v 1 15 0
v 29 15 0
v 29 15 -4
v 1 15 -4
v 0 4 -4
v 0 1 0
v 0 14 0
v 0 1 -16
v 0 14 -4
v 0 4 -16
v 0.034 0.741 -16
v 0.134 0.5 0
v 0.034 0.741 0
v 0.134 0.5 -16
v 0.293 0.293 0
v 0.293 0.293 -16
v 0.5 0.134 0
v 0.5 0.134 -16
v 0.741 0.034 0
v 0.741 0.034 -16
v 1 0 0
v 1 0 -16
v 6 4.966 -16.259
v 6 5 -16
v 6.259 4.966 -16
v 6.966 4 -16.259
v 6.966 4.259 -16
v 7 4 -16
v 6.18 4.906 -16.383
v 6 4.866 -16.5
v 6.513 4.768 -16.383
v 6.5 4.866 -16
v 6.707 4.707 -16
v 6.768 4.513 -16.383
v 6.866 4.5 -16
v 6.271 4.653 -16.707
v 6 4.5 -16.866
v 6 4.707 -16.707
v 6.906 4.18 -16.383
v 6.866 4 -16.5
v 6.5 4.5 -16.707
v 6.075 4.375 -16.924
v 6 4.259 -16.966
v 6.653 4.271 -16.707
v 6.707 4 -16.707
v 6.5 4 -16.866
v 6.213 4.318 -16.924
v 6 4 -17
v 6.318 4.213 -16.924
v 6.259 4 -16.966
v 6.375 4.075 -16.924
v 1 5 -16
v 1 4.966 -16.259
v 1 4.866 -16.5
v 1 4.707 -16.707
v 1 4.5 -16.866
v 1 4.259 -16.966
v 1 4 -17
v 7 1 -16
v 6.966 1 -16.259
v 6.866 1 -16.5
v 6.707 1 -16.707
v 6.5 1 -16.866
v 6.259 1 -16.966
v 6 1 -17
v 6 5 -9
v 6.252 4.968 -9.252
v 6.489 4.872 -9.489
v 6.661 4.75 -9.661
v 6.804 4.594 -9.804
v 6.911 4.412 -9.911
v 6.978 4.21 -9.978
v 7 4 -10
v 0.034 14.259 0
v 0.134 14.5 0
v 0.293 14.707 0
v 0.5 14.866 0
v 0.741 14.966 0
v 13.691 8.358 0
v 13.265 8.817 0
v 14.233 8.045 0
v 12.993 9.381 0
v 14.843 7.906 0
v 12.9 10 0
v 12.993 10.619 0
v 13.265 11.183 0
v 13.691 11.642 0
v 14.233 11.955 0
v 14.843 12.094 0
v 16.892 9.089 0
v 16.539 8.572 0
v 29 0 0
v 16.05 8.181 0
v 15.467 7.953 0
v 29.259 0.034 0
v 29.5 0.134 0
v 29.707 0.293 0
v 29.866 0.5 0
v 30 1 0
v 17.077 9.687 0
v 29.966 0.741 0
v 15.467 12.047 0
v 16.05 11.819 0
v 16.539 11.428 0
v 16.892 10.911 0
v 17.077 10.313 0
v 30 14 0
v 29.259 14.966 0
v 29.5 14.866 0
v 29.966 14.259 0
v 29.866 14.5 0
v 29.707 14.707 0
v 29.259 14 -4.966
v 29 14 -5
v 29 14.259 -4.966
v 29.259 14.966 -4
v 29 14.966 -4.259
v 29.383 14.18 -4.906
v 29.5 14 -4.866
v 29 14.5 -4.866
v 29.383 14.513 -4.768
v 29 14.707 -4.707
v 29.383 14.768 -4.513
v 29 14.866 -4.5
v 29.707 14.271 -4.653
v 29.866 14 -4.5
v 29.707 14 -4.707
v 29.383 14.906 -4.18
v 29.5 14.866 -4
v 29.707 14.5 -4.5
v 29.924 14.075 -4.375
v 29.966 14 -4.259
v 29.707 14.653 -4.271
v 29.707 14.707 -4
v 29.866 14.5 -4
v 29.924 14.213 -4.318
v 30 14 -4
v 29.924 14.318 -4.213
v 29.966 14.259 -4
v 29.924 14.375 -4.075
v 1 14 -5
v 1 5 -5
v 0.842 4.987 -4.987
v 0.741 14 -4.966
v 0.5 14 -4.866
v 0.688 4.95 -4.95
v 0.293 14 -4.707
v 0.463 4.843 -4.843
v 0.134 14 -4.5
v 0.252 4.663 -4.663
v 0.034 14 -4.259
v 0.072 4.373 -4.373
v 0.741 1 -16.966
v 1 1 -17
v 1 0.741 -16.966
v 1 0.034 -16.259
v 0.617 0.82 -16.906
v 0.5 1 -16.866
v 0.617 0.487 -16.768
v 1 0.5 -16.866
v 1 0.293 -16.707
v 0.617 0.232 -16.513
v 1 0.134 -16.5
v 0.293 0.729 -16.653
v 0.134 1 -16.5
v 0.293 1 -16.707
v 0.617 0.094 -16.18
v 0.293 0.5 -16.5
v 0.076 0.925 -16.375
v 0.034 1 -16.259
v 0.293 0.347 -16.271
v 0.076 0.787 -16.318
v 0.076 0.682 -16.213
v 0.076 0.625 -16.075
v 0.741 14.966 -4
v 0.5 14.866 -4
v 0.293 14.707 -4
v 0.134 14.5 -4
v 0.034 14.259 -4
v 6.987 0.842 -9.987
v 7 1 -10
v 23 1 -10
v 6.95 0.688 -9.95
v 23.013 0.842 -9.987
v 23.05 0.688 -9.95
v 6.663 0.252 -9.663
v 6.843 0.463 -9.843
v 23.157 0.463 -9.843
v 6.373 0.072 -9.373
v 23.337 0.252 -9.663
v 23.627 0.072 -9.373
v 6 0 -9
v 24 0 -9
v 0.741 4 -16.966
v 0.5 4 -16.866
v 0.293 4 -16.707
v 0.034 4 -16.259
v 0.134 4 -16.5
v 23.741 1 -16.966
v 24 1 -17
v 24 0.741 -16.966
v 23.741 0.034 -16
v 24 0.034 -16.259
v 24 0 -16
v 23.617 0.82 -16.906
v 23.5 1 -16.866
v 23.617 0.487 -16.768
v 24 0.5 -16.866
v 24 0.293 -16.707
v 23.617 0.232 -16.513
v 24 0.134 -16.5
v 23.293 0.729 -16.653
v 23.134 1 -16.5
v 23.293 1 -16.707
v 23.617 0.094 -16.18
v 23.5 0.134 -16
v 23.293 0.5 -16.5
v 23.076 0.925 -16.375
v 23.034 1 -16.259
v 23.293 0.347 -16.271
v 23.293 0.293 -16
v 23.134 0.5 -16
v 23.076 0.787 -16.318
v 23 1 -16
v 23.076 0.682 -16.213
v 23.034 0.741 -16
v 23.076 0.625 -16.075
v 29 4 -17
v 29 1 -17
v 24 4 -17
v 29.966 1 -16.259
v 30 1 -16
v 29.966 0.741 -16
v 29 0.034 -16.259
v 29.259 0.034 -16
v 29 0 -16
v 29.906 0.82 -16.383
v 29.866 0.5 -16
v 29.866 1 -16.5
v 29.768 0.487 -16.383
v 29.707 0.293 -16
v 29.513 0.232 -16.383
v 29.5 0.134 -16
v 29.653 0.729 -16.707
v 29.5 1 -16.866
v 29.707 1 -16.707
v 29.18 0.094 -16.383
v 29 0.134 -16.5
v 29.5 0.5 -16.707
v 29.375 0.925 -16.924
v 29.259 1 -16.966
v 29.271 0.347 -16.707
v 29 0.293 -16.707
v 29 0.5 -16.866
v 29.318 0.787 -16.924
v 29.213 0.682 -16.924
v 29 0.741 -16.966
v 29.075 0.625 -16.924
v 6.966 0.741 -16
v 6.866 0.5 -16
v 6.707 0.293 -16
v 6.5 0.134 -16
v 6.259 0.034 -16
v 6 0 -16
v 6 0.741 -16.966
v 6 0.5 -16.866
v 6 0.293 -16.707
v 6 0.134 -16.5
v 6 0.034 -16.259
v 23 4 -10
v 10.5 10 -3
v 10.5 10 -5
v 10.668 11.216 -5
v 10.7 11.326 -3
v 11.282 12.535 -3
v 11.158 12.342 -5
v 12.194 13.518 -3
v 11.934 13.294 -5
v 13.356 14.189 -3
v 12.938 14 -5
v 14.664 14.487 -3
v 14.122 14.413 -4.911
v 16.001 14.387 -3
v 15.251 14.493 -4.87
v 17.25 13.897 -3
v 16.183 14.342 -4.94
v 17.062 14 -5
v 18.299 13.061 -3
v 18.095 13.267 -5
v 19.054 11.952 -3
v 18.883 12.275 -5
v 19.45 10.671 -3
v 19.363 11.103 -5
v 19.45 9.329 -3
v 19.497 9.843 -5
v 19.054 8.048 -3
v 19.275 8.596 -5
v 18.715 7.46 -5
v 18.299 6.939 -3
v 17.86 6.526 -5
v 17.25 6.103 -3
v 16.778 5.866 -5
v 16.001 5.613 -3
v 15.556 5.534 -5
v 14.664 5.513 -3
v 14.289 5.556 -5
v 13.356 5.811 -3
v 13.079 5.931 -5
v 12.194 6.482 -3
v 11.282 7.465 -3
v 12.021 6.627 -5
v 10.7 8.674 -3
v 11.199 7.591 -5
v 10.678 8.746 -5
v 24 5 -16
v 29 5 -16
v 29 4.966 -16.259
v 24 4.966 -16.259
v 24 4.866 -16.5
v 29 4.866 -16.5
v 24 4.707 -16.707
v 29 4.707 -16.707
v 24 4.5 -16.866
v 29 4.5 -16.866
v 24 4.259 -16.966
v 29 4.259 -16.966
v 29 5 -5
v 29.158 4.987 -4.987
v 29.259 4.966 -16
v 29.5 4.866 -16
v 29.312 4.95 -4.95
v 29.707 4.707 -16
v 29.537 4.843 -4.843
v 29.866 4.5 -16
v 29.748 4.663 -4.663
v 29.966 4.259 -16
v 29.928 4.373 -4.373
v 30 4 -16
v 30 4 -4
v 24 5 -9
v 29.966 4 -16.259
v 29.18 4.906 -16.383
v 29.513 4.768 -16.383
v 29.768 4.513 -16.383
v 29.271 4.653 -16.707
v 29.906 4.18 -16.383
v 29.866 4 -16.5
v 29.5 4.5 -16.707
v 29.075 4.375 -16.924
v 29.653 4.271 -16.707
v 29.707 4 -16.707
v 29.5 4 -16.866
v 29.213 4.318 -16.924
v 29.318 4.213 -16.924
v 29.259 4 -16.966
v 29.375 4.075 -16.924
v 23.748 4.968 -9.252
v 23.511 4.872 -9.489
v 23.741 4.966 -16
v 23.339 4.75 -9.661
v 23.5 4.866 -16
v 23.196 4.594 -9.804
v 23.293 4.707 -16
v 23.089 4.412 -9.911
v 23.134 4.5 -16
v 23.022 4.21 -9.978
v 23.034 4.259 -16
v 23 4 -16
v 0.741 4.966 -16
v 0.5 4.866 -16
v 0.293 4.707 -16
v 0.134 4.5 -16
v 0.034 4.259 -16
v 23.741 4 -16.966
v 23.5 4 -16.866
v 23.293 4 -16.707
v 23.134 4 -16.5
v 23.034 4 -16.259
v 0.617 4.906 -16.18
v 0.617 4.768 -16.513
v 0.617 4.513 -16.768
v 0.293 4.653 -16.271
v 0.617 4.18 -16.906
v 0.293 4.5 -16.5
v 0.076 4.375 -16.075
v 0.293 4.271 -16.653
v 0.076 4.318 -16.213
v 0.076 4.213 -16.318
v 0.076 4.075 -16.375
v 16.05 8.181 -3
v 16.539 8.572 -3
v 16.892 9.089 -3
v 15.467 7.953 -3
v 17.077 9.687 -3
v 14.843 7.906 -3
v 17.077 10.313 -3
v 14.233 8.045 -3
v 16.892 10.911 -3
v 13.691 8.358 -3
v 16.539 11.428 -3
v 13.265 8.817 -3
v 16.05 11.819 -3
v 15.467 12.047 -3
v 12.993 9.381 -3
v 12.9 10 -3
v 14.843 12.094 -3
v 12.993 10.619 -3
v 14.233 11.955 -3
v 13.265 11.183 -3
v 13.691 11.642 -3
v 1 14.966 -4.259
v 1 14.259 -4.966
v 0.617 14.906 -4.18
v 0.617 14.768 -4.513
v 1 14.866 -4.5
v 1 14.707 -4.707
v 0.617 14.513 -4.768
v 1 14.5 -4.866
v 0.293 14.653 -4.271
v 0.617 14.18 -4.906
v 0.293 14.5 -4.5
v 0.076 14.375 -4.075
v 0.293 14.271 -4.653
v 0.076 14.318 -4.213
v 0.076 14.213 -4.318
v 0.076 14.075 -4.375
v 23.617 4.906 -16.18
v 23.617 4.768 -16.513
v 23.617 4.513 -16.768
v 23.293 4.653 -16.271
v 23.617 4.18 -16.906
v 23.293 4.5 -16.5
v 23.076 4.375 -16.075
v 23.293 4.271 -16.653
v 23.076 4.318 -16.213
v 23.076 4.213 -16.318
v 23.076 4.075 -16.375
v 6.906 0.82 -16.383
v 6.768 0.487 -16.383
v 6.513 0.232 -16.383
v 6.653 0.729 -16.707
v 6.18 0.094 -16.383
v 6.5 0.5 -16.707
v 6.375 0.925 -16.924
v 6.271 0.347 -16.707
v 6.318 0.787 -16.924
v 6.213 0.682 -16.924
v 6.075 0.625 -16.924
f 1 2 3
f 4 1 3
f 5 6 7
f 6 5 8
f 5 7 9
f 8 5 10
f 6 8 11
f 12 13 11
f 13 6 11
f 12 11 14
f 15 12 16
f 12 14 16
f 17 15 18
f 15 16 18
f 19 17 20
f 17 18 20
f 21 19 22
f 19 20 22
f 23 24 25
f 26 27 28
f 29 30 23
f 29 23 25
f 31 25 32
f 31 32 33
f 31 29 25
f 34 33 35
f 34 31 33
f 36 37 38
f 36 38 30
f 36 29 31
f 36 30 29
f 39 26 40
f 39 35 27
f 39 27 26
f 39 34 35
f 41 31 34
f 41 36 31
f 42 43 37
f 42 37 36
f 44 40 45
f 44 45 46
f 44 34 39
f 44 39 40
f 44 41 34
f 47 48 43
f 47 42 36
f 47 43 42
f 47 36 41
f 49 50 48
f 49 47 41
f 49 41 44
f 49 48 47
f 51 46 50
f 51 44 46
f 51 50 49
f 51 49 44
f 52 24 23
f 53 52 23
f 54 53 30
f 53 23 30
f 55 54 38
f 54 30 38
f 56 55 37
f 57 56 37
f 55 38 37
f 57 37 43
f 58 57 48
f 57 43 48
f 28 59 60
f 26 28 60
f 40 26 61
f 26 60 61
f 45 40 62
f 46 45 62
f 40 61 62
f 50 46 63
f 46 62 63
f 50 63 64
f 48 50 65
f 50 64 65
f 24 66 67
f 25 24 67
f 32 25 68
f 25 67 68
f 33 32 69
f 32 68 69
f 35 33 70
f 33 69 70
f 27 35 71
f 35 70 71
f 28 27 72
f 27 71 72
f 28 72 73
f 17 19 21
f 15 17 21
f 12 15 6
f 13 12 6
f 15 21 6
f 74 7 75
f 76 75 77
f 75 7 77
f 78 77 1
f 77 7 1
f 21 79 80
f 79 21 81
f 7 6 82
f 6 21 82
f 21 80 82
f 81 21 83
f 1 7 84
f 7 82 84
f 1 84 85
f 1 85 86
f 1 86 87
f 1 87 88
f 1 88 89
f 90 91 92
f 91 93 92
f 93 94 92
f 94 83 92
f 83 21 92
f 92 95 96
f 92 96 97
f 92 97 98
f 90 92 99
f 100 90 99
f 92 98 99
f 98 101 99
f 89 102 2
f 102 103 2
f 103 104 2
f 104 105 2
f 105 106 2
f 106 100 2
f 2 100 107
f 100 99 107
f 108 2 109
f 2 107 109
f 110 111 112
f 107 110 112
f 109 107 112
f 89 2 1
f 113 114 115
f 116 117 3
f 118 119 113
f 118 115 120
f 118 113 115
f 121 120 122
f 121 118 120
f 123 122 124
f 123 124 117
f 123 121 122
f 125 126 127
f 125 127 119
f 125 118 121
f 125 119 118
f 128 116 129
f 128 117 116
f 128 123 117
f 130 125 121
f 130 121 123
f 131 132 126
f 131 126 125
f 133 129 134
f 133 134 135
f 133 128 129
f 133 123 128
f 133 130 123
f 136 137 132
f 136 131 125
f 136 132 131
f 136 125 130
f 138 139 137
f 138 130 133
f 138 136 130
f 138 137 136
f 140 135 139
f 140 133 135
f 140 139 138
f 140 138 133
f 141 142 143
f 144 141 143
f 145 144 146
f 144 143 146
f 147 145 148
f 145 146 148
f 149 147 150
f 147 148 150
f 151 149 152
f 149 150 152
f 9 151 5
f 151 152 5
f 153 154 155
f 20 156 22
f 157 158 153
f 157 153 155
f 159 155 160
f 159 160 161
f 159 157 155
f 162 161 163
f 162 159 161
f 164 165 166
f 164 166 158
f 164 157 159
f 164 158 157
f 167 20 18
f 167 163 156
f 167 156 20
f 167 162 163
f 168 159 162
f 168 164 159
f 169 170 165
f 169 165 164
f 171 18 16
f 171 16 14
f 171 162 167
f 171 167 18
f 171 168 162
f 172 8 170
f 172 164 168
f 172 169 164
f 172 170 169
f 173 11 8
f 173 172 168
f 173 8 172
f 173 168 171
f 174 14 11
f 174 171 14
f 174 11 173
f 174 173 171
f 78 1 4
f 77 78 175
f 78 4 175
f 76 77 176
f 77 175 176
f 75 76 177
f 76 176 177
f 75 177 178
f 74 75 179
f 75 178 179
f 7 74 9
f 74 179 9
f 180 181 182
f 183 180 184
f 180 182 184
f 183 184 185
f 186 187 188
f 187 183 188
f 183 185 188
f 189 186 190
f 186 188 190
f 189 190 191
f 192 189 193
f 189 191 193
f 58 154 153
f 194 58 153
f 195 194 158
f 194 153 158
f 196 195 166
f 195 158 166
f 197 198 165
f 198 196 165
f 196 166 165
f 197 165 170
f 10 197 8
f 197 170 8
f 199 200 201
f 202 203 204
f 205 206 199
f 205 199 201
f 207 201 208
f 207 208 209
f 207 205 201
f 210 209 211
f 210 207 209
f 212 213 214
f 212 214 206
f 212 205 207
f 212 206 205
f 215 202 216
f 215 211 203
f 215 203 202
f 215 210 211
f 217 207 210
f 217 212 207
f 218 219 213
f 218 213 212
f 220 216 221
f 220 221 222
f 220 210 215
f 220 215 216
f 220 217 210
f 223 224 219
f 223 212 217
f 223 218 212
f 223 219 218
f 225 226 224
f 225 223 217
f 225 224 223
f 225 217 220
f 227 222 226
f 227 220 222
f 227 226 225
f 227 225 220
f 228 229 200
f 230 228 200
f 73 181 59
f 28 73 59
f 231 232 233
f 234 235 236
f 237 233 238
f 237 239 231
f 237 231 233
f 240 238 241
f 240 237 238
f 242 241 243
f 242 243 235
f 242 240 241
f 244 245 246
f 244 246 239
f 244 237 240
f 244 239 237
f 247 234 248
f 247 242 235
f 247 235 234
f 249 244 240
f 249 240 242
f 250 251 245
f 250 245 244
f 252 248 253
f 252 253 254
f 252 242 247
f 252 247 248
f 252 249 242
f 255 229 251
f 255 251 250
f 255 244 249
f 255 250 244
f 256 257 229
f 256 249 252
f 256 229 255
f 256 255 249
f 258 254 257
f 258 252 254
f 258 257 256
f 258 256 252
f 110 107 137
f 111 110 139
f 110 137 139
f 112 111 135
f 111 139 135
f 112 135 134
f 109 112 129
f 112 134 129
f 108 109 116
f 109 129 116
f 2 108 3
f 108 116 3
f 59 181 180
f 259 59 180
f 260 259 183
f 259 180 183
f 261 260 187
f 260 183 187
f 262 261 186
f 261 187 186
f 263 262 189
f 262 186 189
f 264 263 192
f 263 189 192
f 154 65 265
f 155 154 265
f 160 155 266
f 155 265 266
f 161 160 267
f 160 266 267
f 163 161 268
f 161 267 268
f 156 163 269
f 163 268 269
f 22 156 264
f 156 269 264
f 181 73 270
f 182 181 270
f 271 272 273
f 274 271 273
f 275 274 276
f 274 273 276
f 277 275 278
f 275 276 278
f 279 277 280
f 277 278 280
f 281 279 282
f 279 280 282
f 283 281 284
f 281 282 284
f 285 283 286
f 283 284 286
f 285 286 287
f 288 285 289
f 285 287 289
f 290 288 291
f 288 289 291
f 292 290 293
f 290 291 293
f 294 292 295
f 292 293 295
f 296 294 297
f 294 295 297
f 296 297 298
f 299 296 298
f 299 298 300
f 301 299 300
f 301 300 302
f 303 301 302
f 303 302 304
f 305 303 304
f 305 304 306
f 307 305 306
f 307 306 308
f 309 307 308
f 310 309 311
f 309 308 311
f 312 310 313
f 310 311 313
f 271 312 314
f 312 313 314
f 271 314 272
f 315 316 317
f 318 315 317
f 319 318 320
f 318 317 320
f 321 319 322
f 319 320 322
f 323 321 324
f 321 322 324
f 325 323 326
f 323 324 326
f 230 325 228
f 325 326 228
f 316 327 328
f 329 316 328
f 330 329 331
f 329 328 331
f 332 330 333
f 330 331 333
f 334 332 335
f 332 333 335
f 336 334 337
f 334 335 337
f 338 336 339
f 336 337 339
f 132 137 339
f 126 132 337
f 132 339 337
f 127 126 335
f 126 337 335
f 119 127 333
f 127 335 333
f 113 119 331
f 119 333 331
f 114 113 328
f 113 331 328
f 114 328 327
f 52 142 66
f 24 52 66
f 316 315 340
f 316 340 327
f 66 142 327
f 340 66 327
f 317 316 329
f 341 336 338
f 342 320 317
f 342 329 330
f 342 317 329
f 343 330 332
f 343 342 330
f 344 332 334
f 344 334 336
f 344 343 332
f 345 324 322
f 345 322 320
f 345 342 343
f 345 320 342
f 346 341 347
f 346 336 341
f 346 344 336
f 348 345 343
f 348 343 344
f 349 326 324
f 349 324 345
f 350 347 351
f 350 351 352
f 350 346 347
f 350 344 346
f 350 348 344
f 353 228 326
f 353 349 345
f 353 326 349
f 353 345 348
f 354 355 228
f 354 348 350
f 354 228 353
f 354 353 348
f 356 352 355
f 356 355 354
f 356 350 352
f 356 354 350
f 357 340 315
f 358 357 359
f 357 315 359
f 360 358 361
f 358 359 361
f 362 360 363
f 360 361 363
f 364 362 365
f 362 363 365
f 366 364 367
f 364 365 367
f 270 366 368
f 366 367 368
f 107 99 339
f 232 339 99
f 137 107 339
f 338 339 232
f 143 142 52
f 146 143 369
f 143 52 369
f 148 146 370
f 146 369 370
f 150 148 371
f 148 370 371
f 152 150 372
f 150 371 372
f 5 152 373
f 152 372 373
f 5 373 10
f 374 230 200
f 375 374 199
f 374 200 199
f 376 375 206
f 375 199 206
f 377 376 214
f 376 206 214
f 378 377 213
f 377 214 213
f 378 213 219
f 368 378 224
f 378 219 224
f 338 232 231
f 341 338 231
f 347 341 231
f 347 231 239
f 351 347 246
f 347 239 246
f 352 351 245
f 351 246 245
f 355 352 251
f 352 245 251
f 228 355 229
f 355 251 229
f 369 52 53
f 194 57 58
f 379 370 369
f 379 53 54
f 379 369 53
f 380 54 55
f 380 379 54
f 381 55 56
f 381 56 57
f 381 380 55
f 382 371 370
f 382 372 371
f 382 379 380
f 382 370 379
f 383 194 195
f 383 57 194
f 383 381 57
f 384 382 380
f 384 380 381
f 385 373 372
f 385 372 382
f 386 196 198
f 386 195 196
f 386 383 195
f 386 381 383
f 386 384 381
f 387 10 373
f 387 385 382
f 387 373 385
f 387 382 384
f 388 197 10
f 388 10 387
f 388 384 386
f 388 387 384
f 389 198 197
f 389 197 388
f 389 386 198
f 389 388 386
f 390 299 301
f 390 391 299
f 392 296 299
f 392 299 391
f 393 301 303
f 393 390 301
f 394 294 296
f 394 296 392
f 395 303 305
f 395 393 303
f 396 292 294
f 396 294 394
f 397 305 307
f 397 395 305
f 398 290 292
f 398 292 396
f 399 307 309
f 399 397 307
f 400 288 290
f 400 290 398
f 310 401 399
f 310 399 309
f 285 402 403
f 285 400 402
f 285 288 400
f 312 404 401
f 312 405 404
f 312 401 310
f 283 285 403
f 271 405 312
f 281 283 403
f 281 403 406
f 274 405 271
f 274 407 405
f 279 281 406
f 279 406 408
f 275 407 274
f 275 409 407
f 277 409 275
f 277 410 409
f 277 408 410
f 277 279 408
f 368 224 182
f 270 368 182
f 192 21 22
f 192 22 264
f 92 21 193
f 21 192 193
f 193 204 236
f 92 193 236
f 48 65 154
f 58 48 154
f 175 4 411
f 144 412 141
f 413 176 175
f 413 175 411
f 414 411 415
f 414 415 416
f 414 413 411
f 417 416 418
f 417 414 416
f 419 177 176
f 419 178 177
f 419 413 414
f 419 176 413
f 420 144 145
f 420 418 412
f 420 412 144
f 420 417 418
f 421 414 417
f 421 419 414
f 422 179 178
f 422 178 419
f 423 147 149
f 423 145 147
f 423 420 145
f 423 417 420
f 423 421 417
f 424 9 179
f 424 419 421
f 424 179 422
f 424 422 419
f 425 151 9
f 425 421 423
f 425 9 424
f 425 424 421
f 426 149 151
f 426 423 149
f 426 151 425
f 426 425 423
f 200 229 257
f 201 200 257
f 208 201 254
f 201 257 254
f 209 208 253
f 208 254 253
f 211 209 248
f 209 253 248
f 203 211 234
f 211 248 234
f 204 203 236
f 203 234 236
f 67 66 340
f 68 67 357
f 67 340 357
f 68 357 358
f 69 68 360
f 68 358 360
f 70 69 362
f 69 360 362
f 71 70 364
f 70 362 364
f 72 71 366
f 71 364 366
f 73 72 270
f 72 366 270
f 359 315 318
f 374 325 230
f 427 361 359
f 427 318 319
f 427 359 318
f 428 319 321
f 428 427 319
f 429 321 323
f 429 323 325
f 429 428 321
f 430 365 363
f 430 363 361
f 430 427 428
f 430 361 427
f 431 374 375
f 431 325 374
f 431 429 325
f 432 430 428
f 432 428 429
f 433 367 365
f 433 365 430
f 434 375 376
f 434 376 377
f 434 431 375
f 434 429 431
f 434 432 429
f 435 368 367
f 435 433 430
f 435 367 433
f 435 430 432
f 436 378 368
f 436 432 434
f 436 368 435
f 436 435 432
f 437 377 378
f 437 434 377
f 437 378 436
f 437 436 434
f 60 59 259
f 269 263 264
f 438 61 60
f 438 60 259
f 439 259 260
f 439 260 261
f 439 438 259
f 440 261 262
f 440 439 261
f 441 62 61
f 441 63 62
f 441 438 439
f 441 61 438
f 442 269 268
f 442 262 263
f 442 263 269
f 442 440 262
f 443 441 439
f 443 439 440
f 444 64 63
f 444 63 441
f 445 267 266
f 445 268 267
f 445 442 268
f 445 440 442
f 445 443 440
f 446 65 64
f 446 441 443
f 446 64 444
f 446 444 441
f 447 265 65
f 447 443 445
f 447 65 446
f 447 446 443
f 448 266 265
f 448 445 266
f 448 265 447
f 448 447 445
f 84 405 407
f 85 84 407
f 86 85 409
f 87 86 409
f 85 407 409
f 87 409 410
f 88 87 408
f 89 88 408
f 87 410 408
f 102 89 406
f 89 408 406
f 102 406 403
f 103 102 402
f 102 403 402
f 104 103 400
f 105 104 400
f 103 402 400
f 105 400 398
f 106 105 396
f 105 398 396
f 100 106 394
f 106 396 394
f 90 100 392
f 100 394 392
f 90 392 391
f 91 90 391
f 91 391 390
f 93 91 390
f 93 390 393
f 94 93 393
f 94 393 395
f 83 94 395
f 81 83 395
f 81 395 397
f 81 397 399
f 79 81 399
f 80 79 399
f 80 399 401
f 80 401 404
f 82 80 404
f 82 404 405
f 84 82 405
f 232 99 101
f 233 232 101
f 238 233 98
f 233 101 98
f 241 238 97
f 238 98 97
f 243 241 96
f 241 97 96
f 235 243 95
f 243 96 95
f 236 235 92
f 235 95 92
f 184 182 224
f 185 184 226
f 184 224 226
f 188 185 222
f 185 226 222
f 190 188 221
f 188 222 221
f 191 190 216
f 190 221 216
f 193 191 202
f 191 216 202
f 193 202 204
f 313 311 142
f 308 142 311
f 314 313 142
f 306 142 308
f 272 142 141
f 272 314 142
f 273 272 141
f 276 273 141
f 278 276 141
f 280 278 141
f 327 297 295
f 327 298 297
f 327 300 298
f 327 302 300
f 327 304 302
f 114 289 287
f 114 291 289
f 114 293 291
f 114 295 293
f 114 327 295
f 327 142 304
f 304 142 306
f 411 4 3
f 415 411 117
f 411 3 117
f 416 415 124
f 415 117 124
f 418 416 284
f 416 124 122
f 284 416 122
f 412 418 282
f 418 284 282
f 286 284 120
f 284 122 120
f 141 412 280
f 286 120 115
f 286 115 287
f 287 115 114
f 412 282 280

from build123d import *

# Parameters (mm, degrees)
Y_KSEKLIK_EKSTR_ZYON1_DEPTH = 5
IZIM2_W                     = 5
IZIM2_H                     = 10
Y_KSEKLIK_EKSTR_ZYON2_DEPTH = 30
IZIM3_R                     = 2.1
KES_EKSTR_ZYON3_DEPTH       = 5
IZIM4_R                     = 4.5
KES_EKSTR_ZYON4_DEPTH       = 2
RADYUS1_R                   = 1


with BuildPart() as part:
    # Çizim1 → Yükseklik-Ekstrüzyon1 (new body)
    with BuildSketch(Plane(origin=(0, 0, 0), x_dir=(1, 0, 0), z_dir=(0, 1, 0))):
        Polygon((0, 17), (0, 0), (30, 0), (30, 17), (23, 17), (23, 10), (7, 10), (7, 17), align=None)
    extrude(amount=Y_KSEKLIK_EKSTR_ZYON1_DEPTH)

    # Çizim2 → Yükseklik-Ekstrüzyon2 (add)
    with BuildSketch(Plane(origin=(30, 0, 0), x_dir=(0, 0, -1), z_dir=(1, 0, 0))):
        with Locations((2.5, 10)):
            Rectangle(IZIM2_W, IZIM2_H)
    extrude(amount=-Y_KSEKLIK_EKSTR_ZYON2_DEPTH)

    # Çizim3 → Kes-Ekstrüzyon3 (cut)
    with BuildSketch(Plane(origin=(0, 0, -5), x_dir=(-1, 0, 0), z_dir=(0, 0, -1))):
        with Locations((-15, 10)):
            Circle(IZIM3_R)
    extrude(amount=-KES_EKSTR_ZYON3_DEPTH, mode=Mode.SUBTRACT)

    # Çizim4 → Kes-Ekstrüzyon4 (cut)
    with BuildSketch(Plane(origin=(0, 0, -5), x_dir=(-1, 0, 0), z_dir=(0, 0, -1))):
        with Locations((-15, 10)):
            Circle(IZIM4_R)
    extrude(amount=-KES_EKSTR_ZYON4_DEPTH, mode=Mode.SUBTRACT)

    # Radyus1
    # the kernel refuses this fillet: 1 mm, written as the material it takes off along each edge
    with BuildSketch(Plane(origin=(1, 4, -16), x_dir=(0, 0, -1), z_dir=(-1, 0, 0))) as radyus1_piece_1_section:
        Polygon((0, 0), (RADYUS1_R, 0), (RADYUS1_R, -RADYUS1_R), (0, -RADYUS1_R), align=None)
    radyus1_piece_1 = extrude(amount=RADYUS1_R, mode=Mode.PRIVATE)
    radyus1_piece_1 = radyus1_piece_1 - Plane(origin=(1, 4, -16), x_dir=(0, -0.7071067811865475, 0.7071067811865475), z_dir=(-1, 0, 0)) * Sphere(RADYUS1_R, mode=Mode.PRIVATE)
    add(radyus1_piece_1, mode=Mode.SUBTRACT)
    with BuildSketch(Plane(origin=(24, 4, -16), x_dir=(0, 1, 0), z_dir=(-1, 0, 0))) as radyus1_piece_2_section:
        Polygon((0, 0), (RADYUS1_R, 0), (RADYUS1_R, RADYUS1_R), (0, RADYUS1_R), align=None)
    radyus1_piece_2 = extrude(amount=RADYUS1_R, mode=Mode.PRIVATE)
    radyus1_piece_2 = radyus1_piece_2 - Plane(origin=(24, 4, -16), x_dir=(0, -0.7071067811865475, 0.7071067811865475), z_dir=(-1, 0, 0)) * Sphere(RADYUS1_R, mode=Mode.PRIVATE)
    add(radyus1_piece_2, mode=Mode.SUBTRACT)
    with BuildSketch(Plane(origin=(29, 14, -4), x_dir=(0, 0, -1), z_dir=(1, 0, 0))) as radyus1_piece_3_section:
        Polygon((0, 0), (RADYUS1_R, 0), (RADYUS1_R, RADYUS1_R), (0, RADYUS1_R), align=None)
    radyus1_piece_3 = extrude(amount=RADYUS1_R, mode=Mode.PRIVATE)
    radyus1_piece_3 = radyus1_piece_3 - Plane(origin=(29, 14, -4), x_dir=(0, -0.7071067811865475, 0.7071067811865475), z_dir=(1, 0, 0)) * Sphere(RADYUS1_R, mode=Mode.PRIVATE)
    add(radyus1_piece_3, mode=Mode.SUBTRACT)
    with BuildSketch(Plane(origin=(1, 14, -4), x_dir=(0, 0, -1), z_dir=(-1, 0, 0))) as radyus1_piece_4_section:
        Polygon((0, 0), (RADYUS1_R, 0), (RADYUS1_R, -RADYUS1_R), (0, -RADYUS1_R), align=None)
    radyus1_piece_4 = extrude(amount=RADYUS1_R, mode=Mode.PRIVATE)
    radyus1_piece_4 = radyus1_piece_4 - Plane(origin=(1, 14, -4), x_dir=(0, -0.7071067811865475, 0.7071067811865475), z_dir=(-1, 0, 0)) * Sphere(RADYUS1_R, mode=Mode.PRIVATE)
    add(radyus1_piece_4, mode=Mode.SUBTRACT)
    with BuildSketch(Plane(origin=(29, 4, -16), x_dir=(0, 1, 0), z_dir=(0, 0, -1))) as radyus1_piece_5_section:
        Polygon((0, 0), (RADYUS1_R, 0), (RADYUS1_R, RADYUS1_R), (0, RADYUS1_R), align=None)
    radyus1_piece_5 = extrude(amount=RADYUS1_R, mode=Mode.PRIVATE)
    radyus1_piece_5 = radyus1_piece_5 - Plane(origin=(29, 4, -16), x_dir=(-0.7071067811865475, -0.7071067811865475, 0), z_dir=(0, 0, -1)) * Sphere(RADYUS1_R, mode=Mode.PRIVATE)
    add(radyus1_piece_5, mode=Mode.SUBTRACT)
    with BuildSketch(Plane(origin=(29, 1, -16), x_dir=(1, 0, 0), z_dir=(0, 0, -1))) as radyus1_piece_6_section:
        Polygon((0, 0), (RADYUS1_R, 0), (RADYUS1_R, RADYUS1_R), (0, RADYUS1_R), align=None)
    radyus1_piece_6 = extrude(amount=RADYUS1_R, mode=Mode.PRIVATE)
    radyus1_piece_6 = radyus1_piece_6 - Plane(origin=(29, 1, -16), x_dir=(-0.7071067811865475, 0.7071067811865475, 0), z_dir=(0, 0, -1)) * Sphere(RADYUS1_R, mode=Mode.PRIVATE)
    add(radyus1_piece_6, mode=Mode.SUBTRACT)
    with BuildSketch(Plane(origin=(24, 1, -16), x_dir=(0, 0, -1), z_dir=(-1, 0, 0))) as radyus1_piece_7_section:
        Polygon((0, 0), (RADYUS1_R, 0), (RADYUS1_R, RADYUS1_R), (0, RADYUS1_R), align=None)
    radyus1_piece_7 = extrude(amount=RADYUS1_R, mode=Mode.PRIVATE)
    radyus1_piece_7 = radyus1_piece_7 - Plane(origin=(24, 1, -16), x_dir=(0, 0.7071067811865475, 0.7071067811865475), z_dir=(-1, 0, 0)) * Sphere(RADYUS1_R, mode=Mode.PRIVATE)
    add(radyus1_piece_7, mode=Mode.SUBTRACT)
    with BuildSketch(Plane(origin=(6, 4, -16), x_dir=(0, 1, 0), z_dir=(0, 0, -1))) as radyus1_piece_8_section:
        Polygon((0, 0), (RADYUS1_R, 0), (RADYUS1_R, RADYUS1_R), (0, RADYUS1_R), align=None)
    radyus1_piece_8 = extrude(amount=RADYUS1_R, mode=Mode.PRIVATE)
    radyus1_piece_8 = radyus1_piece_8 - Plane(origin=(6, 4, -16), x_dir=(-0.7071067811865475, -0.7071067811865475, 0), z_dir=(0, 0, -1)) * Sphere(RADYUS1_R, mode=Mode.PRIVATE)
    add(radyus1_piece_8, mode=Mode.SUBTRACT)
    with BuildSketch(Plane(origin=(1, 1, -16), x_dir=(0, 0, -1), z_dir=(-1, 0, 0))) as radyus1_piece_9_section:
        Polygon((0, 0), (RADYUS1_R, 0), (RADYUS1_R, RADYUS1_R), (0, RADYUS1_R), align=None)
    radyus1_piece_9 = extrude(amount=RADYUS1_R, mode=Mode.PRIVATE)
    radyus1_piece_9 = radyus1_piece_9 - Plane(origin=(1, 1, -16), x_dir=(0, 0.7071067811865475, 0.7071067811865475), z_dir=(-1, 0, 0)) * Sphere(RADYUS1_R, mode=Mode.PRIVATE)
    add(radyus1_piece_9, mode=Mode.SUBTRACT)
    with BuildSketch(Plane(origin=(6, 1, -16), x_dir=(0, -1, 0), z_dir=(0, 0, -1))) as radyus1_piece_10_section:
        Polygon((0, 0), (RADYUS1_R, 0), (RADYUS1_R, -RADYUS1_R), (0, -RADYUS1_R), align=None)
    radyus1_piece_10 = extrude(amount=RADYUS1_R, mode=Mode.PRIVATE)
    radyus1_piece_10 = radyus1_piece_10 - Plane(origin=(6, 1, -16), x_dir=(-0.7071067811865475, 0.7071067811865475, 0), z_dir=(0, 0, -1)) * Sphere(RADYUS1_R, mode=Mode.PRIVATE)
    add(radyus1_piece_10, mode=Mode.SUBTRACT)
    with BuildSketch(Plane(origin=(0, 5, -16), x_dir=(0, -1, 0), z_dir=(0, 0, 1))) as radyus1_piece_11:
        with BuildLine():
            CenterArc((RADYUS1_R, RADYUS1_R), RADYUS1_R, 180, 90)
            Line((0, RADYUS1_R), (0, 0))
            Line((0, 0), (RADYUS1_R, 0))
        make_face()
    extrude(amount=11, mode=Mode.SUBTRACT)
    with BuildSketch(Plane(origin=(23, 5, -16), x_dir=(1, 0, 0), z_dir=(0, 0, 1)), Plane(origin=(7, 5, -10), x_dir=(-1, 0, 0), z_dir=(0, 0, -1))) as radyus1_piece_12:
        with BuildLine():
            CenterArc((RADYUS1_R, -RADYUS1_R), RADYUS1_R, 90, 90)
            Line((0, -RADYUS1_R), (0, 0))
            Line((0, 0), (RADYUS1_R, 0))
        make_face()
    extrude(amount=6, mode=Mode.SUBTRACT)
    with BuildSketch(Plane(origin=(30, 5, -5), x_dir=(-1, 0, 0), z_dir=(0, 1, 0)), Plane(origin=(0, 5, -5), x_dir=(0, 0, 1), z_dir=(0, 1, 0))) as radyus1_piece_13:
        with BuildLine():
            CenterArc((RADYUS1_R, RADYUS1_R), RADYUS1_R, 180, 90)
            Line((0, RADYUS1_R), (0, 0))
            Line((0, 0), (RADYUS1_R, 0))
        make_face()
    extrude(amount=9, mode=Mode.SUBTRACT)
    with BuildSketch(Plane(origin=(29, 15, -5), x_dir=(0, -1, 0), z_dir=(-1, 0, 0))) as radyus1_piece_14:
        with BuildLine():
            CenterArc((RADYUS1_R, RADYUS1_R), RADYUS1_R, 180, 90)
            Line((0, RADYUS1_R), (0, 0))
            Line((0, 0), (RADYUS1_R, 0))
        make_face()
    extrude(amount=28, mode=Mode.SUBTRACT)
    with BuildSketch(Plane(origin=(30, 5, -5), x_dir=(-1, 0, 0), z_dir=(0, 0, -1))) as radyus1_piece_15:
        with BuildLine():
            CenterArc((RADYUS1_R, -RADYUS1_R), RADYUS1_R, 90, 90)
            Line((0, -RADYUS1_R), (0, 0))
            Line((0, 0), (RADYUS1_R, 0))
        make_face()
    extrude(amount=11, mode=Mode.SUBTRACT)
    with BuildSketch(Plane(origin=(30, 1, -17), x_dir=(-1, 0, 0), z_dir=(0, 1, 0)), Plane(origin=(23, 1, -17), x_dir=(0, 0, 1), z_dir=(0, 1, 0)), Plane(origin=(0, 1, -17), x_dir=(0, 0, 1), z_dir=(0, 1, 0)), Plane(origin=(7, 1, -17), x_dir=(-1, 0, 0), z_dir=(0, 1, 0))) as radyus1_piece_16:
        with BuildLine():
            CenterArc((RADYUS1_R, RADYUS1_R), RADYUS1_R, 180, 90)
            Line((0, RADYUS1_R), (0, 0))
            Line((0, 0), (RADYUS1_R, 0))
        make_face()
    extrude(amount=3, mode=Mode.SUBTRACT)
    with BuildSketch(Plane(origin=(29, 5, -17), x_dir=(0, 0, 1), z_dir=(-1, 0, 0)), Plane(origin=(6, 0, -17), x_dir=(0, 1, 0), z_dir=(-1, 0, 0))) as radyus1_piece_17:
        with BuildLine():
            CenterArc((RADYUS1_R, -RADYUS1_R), RADYUS1_R, 90, 90)
            Line((0, -RADYUS1_R), (0, 0))
            Line((0, 0), (RADYUS1_R, 0))
        make_face()
    extrude(amount=5, mode=Mode.SUBTRACT)
    with BuildSketch(Plane(origin=(23, 5, -10), x_dir=(0, 0, 1), z_dir=(-1, 0, 0))) as radyus1_piece_18:
        with BuildLine():
            CenterArc((RADYUS1_R, -RADYUS1_R), RADYUS1_R, 90, 90)
            Line((0, -RADYUS1_R), (0, 0))
            Line((0, 0), (RADYUS1_R, 0))
        make_face()
    extrude(amount=16, mode=Mode.SUBTRACT)
    with BuildSketch(Plane(origin=(6, 5, -17), x_dir=(0, -1, 0), z_dir=(-1, 0, 0)), Plane(origin=(29, 0, -17), x_dir=(0, 0, 1), z_dir=(-1, 0, 0))) as radyus1_piece_19:
        with BuildLine():
            CenterArc((RADYUS1_R, RADYUS1_R), RADYUS1_R, 180, 90)
            Line((0, RADYUS1_R), (0, 0))
            Line((0, 0), (RADYUS1_R, 0))
        make_face()
    extrude(amount=5, mode=Mode.SUBTRACT)
    with BuildSketch(Plane(origin=(0, 0, -16), x_dir=(0, 1, 0), z_dir=(0, 0, 1))) as radyus1_piece_20:
        with BuildLine():
            CenterArc((RADYUS1_R, -RADYUS1_R), RADYUS1_R, 90, 90)
            Line((0, -RADYUS1_R), (0, 0))
            Line((0, 0), (RADYUS1_R, 0))
        make_face()
    extrude(amount=18.5, mode=Mode.SUBTRACT)
    with BuildSketch(Plane(origin=(7, 0, -10), x_dir=(-1, 0, 0), z_dir=(0, 0, -1)), Plane(origin=(23, 0, -16), x_dir=(1, 0, 0), z_dir=(0, 0, 1))) as radyus1_piece_21:
        with BuildLine():
            CenterArc((RADYUS1_R, RADYUS1_R), RADYUS1_R, 180, 90)
            Line((0, RADYUS1_R), (0, 0))
            Line((0, 0), (RADYUS1_R, 0))
        make_face()
    extrude(amount=6, mode=Mode.SUBTRACT)
    with BuildSketch(Plane(origin=(23, 0, -10), x_dir=(0, 0, 1), z_dir=(-1, 0, 0))) as radyus1_piece_22:
        with BuildLine():
            CenterArc((RADYUS1_R, RADYUS1_R), RADYUS1_R, 180, 90)
            Line((0, RADYUS1_R), (0, 0))
            Line((0, 0), (RADYUS1_R, 0))
        make_face()
    extrude(amount=16, mode=Mode.SUBTRACT)
    with BuildSketch(Plane(origin=(30, 0, 2.5), x_dir=(-1, 0, 0), z_dir=(0, 0, -1))) as radyus1_piece_23:
        with BuildLine():
            CenterArc((RADYUS1_R, RADYUS1_R), RADYUS1_R, 180, 90)
            Line((0, RADYUS1_R), (0, 0))
            Line((0, 0), (RADYUS1_R, 0))
        make_face()
    extrude(amount=18.5, mode=Mode.SUBTRACT)
    with BuildSketch(Plane(origin=(30, 15, -4), x_dir=(-1, 0, 0), z_dir=(0, 0, 1)), Plane(origin=(0, 15, -4), x_dir=(0, -1, 0), z_dir=(0, 0, 1))) as radyus1_piece_24:
        with BuildLine():
            CenterArc((RADYUS1_R, RADYUS1_R), RADYUS1_R, 180, 90)
            Line((0, RADYUS1_R), (0, 0))
            Line((0, 0), (RADYUS1_R, 0))
        make_face()
    extrude(amount=6.5, mode=Mode.SUBTRACT)
    with BuildSketch(Plane(origin=(0, 5, -16), x_dir=(0, -1, 0), z_dir=(0, 0, 1))) as radyus1_piece_25a_section:
        with BuildLine():
            CenterArc((RADYUS1_R, RADYUS1_R), RADYUS1_R, 180, 90)
            Line((0, RADYUS1_R), (0, 0))
            Line((0, 0), (RADYUS1_R, 0))
        make_face()
    radyus1_piece_25a = extrude(amount=13.5, mode=Mode.PRIVATE)
    radyus1_piece_25a = split(radyus1_piece_25a, bisect_by=Plane(origin=(0.226395114, 4.773604886, -5), z_dir=(0, 0, 1)), keep=Keep.TOP, mode=Mode.PRIVATE)
    with BuildSketch(Plane(origin=(0, 2.5, -5), x_dir=(0, 0, 1), z_dir=(0, 1, 0))) as radyus1_piece_25b_section:
        with BuildLine():
            CenterArc((RADYUS1_R, RADYUS1_R), RADYUS1_R, 180, 90)
            Line((0, RADYUS1_R), (0, 0))
            Line((0, 0), (RADYUS1_R, 0))
        make_face()
    radyus1_piece_25b = extrude(amount=11.5, mode=Mode.PRIVATE)
    radyus1_piece_25b = split(radyus1_piece_25b, bisect_by=Plane(origin=(0.226395114, 5, -4.773604886), z_dir=(0, -1, 0)), keep=Keep.TOP, mode=Mode.PRIVATE)
    radyus1_piece_25 = radyus1_piece_25a & radyus1_piece_25b
    add(radyus1_piece_25, mode=Mode.SUBTRACT)
    with BuildSketch(Plane(origin=(25.5, 5, -10), x_dir=(0, 0, 1), z_dir=(-1, 0, 0))) as radyus1_piece_26a_section:
        with BuildLine():
            CenterArc((RADYUS1_R, -RADYUS1_R), RADYUS1_R, 90, 90)
            Line((0, -RADYUS1_R), (0, 0))
            Line((0, 0), (RADYUS1_R, 0))
        make_face()
    radyus1_piece_26a = extrude(amount=18.5, mode=Mode.PRIVATE)
    radyus1_piece_26a = split(radyus1_piece_26a, bisect_by=Plane(origin=(23, 4.773604886, -9.773604886), z_dir=(1, 0, 0)), keep=Keep.TOP, mode=Mode.PRIVATE)
    with BuildSketch(Plane(origin=(23, 5, -16), x_dir=(1, 0, 0), z_dir=(0, 0, 1))) as radyus1_piece_26b_section:
        with BuildLine():
            CenterArc((RADYUS1_R, -RADYUS1_R), RADYUS1_R, 90, 90)
            Line((0, -RADYUS1_R), (0, 0))
            Line((0, 0), (RADYUS1_R, 0))
        make_face()
    radyus1_piece_26b = extrude(amount=8.5, mode=Mode.PRIVATE)
    radyus1_piece_26b = split(radyus1_piece_26b, bisect_by=Plane(origin=(23.226395114, 4.773604886, -10), z_dir=(0, 0, 1)), keep=Keep.TOP, mode=Mode.PRIVATE)
    radyus1_piece_26 = radyus1_piece_26a & radyus1_piece_26b
    add(radyus1_piece_26, mode=Mode.SUBTRACT)
    with BuildSketch(Plane(origin=(30, 5, -2.5), x_dir=(-1, 0, 0), z_dir=(0, 0, -1))) as radyus1_piece_27a_section:
        with BuildLine():
            CenterArc((RADYUS1_R, -RADYUS1_R), RADYUS1_R, 90, 90)
            Line((0, -RADYUS1_R), (0, 0))
            Line((0, 0), (RADYUS1_R, 0))
        make_face()
    radyus1_piece_27a = extrude(amount=13.5, mode=Mode.PRIVATE)
    radyus1_piece_27a = split(radyus1_piece_27a, bisect_by=Plane(origin=(29.773604886, 4.773604886, -5), z_dir=(0, 0, 1)), keep=Keep.TOP, mode=Mode.PRIVATE)
    with BuildSketch(Plane(origin=(30, 2.5, -5), x_dir=(-1, 0, 0), z_dir=(0, 1, 0))) as radyus1_piece_27b_section:
        with BuildLine():
            CenterArc((RADYUS1_R, RADYUS1_R), RADYUS1_R, 180, 90)
            Line((0, RADYUS1_R), (0, 0))
            Line((0, 0), (RADYUS1_R, 0))
        make_face()
    radyus1_piece_27b = extrude(amount=11.5, mode=Mode.PRIVATE)
    radyus1_piece_27b = split(radyus1_piece_27b, bisect_by=Plane(origin=(29.773604886, 5, -4.773604886), z_dir=(0, -1, 0)), keep=Keep.TOP, mode=Mode.PRIVATE)
    radyus1_piece_27 = radyus1_piece_27a & radyus1_piece_27b
    add(radyus1_piece_27, mode=Mode.SUBTRACT)
    with BuildSketch(Plane(origin=(7, 5, -7.5), x_dir=(-1, 0, 0), z_dir=(0, 0, -1))) as radyus1_piece_28a_section:
        with BuildLine():
            CenterArc((RADYUS1_R, -RADYUS1_R), RADYUS1_R, 90, 90)
            Line((0, -RADYUS1_R), (0, 0))
            Line((0, 0), (RADYUS1_R, 0))
        make_face()
    radyus1_piece_28a = extrude(amount=8.5, mode=Mode.PRIVATE)
    radyus1_piece_28a = split(radyus1_piece_28a, bisect_by=Plane(origin=(6.773604886, 4.773604886, -10), z_dir=(0, 0, 1)), keep=Keep.TOP, mode=Mode.PRIVATE)
    with BuildSketch(Plane(origin=(23, 5, -10), x_dir=(0, 0, 1), z_dir=(-1, 0, 0))) as radyus1_piece_28b_section:
        with BuildLine():
            CenterArc((RADYUS1_R, -RADYUS1_R), RADYUS1_R, 90, 90)
            Line((0, -RADYUS1_R), (0, 0))
            Line((0, 0), (RADYUS1_R, 0))
        make_face()
    radyus1_piece_28b = extrude(amount=18.5, mode=Mode.PRIVATE)
    radyus1_piece_28b = split(radyus1_piece_28b, bisect_by=Plane(origin=(7, 4.773604886, -9.773604886), z_dir=(-1, 0, 0)), keep=Keep.TOP, mode=Mode.PRIVATE)
    radyus1_piece_28 = radyus1_piece_28a & radyus1_piece_28b
    add(radyus1_piece_28, mode=Mode.SUBTRACT)
    with BuildSketch(Plane(origin=(23, 0, -10), x_dir=(0, 0, 1), z_dir=(-1, 0, 0))) as radyus1_piece_29a_section:
        with BuildLine():
            CenterArc((RADYUS1_R, RADYUS1_R), RADYUS1_R, 180, 90)
            Line((0, RADYUS1_R), (0, 0))
            Line((0, 0), (RADYUS1_R, 0))
        make_face()
    radyus1_piece_29a = extrude(amount=18.5, mode=Mode.PRIVATE)
    radyus1_piece_29a = split(radyus1_piece_29a, bisect_by=Plane(origin=(7, 0.226395114, -9.773604886), z_dir=(-1, 0, 0)), keep=Keep.TOP, mode=Mode.PRIVATE)
    with BuildSketch(Plane(origin=(7, 0, -7.5), x_dir=(-1, 0, 0), z_dir=(0, 0, -1))) as radyus1_piece_29b_section:
        with BuildLine():
            CenterArc((RADYUS1_R, RADYUS1_R), RADYUS1_R, 180, 90)
            Line((0, RADYUS1_R), (0, 0))
            Line((0, 0), (RADYUS1_R, 0))
        make_face()
    radyus1_piece_29b = extrude(amount=8.5, mode=Mode.PRIVATE)
    radyus1_piece_29b = split(radyus1_piece_29b, bisect_by=Plane(origin=(6.773604886, 0.226395114, -10), z_dir=(0, 0, 1)), keep=Keep.TOP, mode=Mode.PRIVATE)
    radyus1_piece_29 = radyus1_piece_29a & radyus1_piece_29b
    add(radyus1_piece_29, mode=Mode.SUBTRACT)
    with BuildSketch(Plane(origin=(23, 0, -16), x_dir=(1, 0, 0), z_dir=(0, 0, 1))) as radyus1_piece_30a_section:
        with BuildLine():
            CenterArc((RADYUS1_R, RADYUS1_R), RADYUS1_R, 180, 90)
            Line((0, RADYUS1_R), (0, 0))
            Line((0, 0), (RADYUS1_R, 0))
        make_face()
    radyus1_piece_30a = extrude(amount=8.5, mode=Mode.PRIVATE)
    radyus1_piece_30a = split(radyus1_piece_30a, bisect_by=Plane(origin=(23.226395114, 0.226395114, -10), z_dir=(0, 0, 1)), keep=Keep.TOP, mode=Mode.PRIVATE)
    with BuildSketch(Plane(origin=(25.5, 0, -10), x_dir=(0, 0, 1), z_dir=(-1, 0, 0))) as radyus1_piece_30b_section:
        with BuildLine():
            CenterArc((RADYUS1_R, RADYUS1_R), RADYUS1_R, 180, 90)
            Line((0, RADYUS1_R), (0, 0))
            Line((0, 0), (RADYUS1_R, 0))
        make_face()
    radyus1_piece_30b = extrude(amount=18.5, mode=Mode.PRIVATE)
    radyus1_piece_30b = split(radyus1_piece_30b, bisect_by=Plane(origin=(23, 0.226395114, -9.773604886), z_dir=(1, 0, 0)), keep=Keep.TOP, mode=Mode.PRIVATE)
    radyus1_piece_30 = radyus1_piece_30a & radyus1_piece_30b
    add(radyus1_piece_30, mode=Mode.SUBTRACT)


solid = part.part
